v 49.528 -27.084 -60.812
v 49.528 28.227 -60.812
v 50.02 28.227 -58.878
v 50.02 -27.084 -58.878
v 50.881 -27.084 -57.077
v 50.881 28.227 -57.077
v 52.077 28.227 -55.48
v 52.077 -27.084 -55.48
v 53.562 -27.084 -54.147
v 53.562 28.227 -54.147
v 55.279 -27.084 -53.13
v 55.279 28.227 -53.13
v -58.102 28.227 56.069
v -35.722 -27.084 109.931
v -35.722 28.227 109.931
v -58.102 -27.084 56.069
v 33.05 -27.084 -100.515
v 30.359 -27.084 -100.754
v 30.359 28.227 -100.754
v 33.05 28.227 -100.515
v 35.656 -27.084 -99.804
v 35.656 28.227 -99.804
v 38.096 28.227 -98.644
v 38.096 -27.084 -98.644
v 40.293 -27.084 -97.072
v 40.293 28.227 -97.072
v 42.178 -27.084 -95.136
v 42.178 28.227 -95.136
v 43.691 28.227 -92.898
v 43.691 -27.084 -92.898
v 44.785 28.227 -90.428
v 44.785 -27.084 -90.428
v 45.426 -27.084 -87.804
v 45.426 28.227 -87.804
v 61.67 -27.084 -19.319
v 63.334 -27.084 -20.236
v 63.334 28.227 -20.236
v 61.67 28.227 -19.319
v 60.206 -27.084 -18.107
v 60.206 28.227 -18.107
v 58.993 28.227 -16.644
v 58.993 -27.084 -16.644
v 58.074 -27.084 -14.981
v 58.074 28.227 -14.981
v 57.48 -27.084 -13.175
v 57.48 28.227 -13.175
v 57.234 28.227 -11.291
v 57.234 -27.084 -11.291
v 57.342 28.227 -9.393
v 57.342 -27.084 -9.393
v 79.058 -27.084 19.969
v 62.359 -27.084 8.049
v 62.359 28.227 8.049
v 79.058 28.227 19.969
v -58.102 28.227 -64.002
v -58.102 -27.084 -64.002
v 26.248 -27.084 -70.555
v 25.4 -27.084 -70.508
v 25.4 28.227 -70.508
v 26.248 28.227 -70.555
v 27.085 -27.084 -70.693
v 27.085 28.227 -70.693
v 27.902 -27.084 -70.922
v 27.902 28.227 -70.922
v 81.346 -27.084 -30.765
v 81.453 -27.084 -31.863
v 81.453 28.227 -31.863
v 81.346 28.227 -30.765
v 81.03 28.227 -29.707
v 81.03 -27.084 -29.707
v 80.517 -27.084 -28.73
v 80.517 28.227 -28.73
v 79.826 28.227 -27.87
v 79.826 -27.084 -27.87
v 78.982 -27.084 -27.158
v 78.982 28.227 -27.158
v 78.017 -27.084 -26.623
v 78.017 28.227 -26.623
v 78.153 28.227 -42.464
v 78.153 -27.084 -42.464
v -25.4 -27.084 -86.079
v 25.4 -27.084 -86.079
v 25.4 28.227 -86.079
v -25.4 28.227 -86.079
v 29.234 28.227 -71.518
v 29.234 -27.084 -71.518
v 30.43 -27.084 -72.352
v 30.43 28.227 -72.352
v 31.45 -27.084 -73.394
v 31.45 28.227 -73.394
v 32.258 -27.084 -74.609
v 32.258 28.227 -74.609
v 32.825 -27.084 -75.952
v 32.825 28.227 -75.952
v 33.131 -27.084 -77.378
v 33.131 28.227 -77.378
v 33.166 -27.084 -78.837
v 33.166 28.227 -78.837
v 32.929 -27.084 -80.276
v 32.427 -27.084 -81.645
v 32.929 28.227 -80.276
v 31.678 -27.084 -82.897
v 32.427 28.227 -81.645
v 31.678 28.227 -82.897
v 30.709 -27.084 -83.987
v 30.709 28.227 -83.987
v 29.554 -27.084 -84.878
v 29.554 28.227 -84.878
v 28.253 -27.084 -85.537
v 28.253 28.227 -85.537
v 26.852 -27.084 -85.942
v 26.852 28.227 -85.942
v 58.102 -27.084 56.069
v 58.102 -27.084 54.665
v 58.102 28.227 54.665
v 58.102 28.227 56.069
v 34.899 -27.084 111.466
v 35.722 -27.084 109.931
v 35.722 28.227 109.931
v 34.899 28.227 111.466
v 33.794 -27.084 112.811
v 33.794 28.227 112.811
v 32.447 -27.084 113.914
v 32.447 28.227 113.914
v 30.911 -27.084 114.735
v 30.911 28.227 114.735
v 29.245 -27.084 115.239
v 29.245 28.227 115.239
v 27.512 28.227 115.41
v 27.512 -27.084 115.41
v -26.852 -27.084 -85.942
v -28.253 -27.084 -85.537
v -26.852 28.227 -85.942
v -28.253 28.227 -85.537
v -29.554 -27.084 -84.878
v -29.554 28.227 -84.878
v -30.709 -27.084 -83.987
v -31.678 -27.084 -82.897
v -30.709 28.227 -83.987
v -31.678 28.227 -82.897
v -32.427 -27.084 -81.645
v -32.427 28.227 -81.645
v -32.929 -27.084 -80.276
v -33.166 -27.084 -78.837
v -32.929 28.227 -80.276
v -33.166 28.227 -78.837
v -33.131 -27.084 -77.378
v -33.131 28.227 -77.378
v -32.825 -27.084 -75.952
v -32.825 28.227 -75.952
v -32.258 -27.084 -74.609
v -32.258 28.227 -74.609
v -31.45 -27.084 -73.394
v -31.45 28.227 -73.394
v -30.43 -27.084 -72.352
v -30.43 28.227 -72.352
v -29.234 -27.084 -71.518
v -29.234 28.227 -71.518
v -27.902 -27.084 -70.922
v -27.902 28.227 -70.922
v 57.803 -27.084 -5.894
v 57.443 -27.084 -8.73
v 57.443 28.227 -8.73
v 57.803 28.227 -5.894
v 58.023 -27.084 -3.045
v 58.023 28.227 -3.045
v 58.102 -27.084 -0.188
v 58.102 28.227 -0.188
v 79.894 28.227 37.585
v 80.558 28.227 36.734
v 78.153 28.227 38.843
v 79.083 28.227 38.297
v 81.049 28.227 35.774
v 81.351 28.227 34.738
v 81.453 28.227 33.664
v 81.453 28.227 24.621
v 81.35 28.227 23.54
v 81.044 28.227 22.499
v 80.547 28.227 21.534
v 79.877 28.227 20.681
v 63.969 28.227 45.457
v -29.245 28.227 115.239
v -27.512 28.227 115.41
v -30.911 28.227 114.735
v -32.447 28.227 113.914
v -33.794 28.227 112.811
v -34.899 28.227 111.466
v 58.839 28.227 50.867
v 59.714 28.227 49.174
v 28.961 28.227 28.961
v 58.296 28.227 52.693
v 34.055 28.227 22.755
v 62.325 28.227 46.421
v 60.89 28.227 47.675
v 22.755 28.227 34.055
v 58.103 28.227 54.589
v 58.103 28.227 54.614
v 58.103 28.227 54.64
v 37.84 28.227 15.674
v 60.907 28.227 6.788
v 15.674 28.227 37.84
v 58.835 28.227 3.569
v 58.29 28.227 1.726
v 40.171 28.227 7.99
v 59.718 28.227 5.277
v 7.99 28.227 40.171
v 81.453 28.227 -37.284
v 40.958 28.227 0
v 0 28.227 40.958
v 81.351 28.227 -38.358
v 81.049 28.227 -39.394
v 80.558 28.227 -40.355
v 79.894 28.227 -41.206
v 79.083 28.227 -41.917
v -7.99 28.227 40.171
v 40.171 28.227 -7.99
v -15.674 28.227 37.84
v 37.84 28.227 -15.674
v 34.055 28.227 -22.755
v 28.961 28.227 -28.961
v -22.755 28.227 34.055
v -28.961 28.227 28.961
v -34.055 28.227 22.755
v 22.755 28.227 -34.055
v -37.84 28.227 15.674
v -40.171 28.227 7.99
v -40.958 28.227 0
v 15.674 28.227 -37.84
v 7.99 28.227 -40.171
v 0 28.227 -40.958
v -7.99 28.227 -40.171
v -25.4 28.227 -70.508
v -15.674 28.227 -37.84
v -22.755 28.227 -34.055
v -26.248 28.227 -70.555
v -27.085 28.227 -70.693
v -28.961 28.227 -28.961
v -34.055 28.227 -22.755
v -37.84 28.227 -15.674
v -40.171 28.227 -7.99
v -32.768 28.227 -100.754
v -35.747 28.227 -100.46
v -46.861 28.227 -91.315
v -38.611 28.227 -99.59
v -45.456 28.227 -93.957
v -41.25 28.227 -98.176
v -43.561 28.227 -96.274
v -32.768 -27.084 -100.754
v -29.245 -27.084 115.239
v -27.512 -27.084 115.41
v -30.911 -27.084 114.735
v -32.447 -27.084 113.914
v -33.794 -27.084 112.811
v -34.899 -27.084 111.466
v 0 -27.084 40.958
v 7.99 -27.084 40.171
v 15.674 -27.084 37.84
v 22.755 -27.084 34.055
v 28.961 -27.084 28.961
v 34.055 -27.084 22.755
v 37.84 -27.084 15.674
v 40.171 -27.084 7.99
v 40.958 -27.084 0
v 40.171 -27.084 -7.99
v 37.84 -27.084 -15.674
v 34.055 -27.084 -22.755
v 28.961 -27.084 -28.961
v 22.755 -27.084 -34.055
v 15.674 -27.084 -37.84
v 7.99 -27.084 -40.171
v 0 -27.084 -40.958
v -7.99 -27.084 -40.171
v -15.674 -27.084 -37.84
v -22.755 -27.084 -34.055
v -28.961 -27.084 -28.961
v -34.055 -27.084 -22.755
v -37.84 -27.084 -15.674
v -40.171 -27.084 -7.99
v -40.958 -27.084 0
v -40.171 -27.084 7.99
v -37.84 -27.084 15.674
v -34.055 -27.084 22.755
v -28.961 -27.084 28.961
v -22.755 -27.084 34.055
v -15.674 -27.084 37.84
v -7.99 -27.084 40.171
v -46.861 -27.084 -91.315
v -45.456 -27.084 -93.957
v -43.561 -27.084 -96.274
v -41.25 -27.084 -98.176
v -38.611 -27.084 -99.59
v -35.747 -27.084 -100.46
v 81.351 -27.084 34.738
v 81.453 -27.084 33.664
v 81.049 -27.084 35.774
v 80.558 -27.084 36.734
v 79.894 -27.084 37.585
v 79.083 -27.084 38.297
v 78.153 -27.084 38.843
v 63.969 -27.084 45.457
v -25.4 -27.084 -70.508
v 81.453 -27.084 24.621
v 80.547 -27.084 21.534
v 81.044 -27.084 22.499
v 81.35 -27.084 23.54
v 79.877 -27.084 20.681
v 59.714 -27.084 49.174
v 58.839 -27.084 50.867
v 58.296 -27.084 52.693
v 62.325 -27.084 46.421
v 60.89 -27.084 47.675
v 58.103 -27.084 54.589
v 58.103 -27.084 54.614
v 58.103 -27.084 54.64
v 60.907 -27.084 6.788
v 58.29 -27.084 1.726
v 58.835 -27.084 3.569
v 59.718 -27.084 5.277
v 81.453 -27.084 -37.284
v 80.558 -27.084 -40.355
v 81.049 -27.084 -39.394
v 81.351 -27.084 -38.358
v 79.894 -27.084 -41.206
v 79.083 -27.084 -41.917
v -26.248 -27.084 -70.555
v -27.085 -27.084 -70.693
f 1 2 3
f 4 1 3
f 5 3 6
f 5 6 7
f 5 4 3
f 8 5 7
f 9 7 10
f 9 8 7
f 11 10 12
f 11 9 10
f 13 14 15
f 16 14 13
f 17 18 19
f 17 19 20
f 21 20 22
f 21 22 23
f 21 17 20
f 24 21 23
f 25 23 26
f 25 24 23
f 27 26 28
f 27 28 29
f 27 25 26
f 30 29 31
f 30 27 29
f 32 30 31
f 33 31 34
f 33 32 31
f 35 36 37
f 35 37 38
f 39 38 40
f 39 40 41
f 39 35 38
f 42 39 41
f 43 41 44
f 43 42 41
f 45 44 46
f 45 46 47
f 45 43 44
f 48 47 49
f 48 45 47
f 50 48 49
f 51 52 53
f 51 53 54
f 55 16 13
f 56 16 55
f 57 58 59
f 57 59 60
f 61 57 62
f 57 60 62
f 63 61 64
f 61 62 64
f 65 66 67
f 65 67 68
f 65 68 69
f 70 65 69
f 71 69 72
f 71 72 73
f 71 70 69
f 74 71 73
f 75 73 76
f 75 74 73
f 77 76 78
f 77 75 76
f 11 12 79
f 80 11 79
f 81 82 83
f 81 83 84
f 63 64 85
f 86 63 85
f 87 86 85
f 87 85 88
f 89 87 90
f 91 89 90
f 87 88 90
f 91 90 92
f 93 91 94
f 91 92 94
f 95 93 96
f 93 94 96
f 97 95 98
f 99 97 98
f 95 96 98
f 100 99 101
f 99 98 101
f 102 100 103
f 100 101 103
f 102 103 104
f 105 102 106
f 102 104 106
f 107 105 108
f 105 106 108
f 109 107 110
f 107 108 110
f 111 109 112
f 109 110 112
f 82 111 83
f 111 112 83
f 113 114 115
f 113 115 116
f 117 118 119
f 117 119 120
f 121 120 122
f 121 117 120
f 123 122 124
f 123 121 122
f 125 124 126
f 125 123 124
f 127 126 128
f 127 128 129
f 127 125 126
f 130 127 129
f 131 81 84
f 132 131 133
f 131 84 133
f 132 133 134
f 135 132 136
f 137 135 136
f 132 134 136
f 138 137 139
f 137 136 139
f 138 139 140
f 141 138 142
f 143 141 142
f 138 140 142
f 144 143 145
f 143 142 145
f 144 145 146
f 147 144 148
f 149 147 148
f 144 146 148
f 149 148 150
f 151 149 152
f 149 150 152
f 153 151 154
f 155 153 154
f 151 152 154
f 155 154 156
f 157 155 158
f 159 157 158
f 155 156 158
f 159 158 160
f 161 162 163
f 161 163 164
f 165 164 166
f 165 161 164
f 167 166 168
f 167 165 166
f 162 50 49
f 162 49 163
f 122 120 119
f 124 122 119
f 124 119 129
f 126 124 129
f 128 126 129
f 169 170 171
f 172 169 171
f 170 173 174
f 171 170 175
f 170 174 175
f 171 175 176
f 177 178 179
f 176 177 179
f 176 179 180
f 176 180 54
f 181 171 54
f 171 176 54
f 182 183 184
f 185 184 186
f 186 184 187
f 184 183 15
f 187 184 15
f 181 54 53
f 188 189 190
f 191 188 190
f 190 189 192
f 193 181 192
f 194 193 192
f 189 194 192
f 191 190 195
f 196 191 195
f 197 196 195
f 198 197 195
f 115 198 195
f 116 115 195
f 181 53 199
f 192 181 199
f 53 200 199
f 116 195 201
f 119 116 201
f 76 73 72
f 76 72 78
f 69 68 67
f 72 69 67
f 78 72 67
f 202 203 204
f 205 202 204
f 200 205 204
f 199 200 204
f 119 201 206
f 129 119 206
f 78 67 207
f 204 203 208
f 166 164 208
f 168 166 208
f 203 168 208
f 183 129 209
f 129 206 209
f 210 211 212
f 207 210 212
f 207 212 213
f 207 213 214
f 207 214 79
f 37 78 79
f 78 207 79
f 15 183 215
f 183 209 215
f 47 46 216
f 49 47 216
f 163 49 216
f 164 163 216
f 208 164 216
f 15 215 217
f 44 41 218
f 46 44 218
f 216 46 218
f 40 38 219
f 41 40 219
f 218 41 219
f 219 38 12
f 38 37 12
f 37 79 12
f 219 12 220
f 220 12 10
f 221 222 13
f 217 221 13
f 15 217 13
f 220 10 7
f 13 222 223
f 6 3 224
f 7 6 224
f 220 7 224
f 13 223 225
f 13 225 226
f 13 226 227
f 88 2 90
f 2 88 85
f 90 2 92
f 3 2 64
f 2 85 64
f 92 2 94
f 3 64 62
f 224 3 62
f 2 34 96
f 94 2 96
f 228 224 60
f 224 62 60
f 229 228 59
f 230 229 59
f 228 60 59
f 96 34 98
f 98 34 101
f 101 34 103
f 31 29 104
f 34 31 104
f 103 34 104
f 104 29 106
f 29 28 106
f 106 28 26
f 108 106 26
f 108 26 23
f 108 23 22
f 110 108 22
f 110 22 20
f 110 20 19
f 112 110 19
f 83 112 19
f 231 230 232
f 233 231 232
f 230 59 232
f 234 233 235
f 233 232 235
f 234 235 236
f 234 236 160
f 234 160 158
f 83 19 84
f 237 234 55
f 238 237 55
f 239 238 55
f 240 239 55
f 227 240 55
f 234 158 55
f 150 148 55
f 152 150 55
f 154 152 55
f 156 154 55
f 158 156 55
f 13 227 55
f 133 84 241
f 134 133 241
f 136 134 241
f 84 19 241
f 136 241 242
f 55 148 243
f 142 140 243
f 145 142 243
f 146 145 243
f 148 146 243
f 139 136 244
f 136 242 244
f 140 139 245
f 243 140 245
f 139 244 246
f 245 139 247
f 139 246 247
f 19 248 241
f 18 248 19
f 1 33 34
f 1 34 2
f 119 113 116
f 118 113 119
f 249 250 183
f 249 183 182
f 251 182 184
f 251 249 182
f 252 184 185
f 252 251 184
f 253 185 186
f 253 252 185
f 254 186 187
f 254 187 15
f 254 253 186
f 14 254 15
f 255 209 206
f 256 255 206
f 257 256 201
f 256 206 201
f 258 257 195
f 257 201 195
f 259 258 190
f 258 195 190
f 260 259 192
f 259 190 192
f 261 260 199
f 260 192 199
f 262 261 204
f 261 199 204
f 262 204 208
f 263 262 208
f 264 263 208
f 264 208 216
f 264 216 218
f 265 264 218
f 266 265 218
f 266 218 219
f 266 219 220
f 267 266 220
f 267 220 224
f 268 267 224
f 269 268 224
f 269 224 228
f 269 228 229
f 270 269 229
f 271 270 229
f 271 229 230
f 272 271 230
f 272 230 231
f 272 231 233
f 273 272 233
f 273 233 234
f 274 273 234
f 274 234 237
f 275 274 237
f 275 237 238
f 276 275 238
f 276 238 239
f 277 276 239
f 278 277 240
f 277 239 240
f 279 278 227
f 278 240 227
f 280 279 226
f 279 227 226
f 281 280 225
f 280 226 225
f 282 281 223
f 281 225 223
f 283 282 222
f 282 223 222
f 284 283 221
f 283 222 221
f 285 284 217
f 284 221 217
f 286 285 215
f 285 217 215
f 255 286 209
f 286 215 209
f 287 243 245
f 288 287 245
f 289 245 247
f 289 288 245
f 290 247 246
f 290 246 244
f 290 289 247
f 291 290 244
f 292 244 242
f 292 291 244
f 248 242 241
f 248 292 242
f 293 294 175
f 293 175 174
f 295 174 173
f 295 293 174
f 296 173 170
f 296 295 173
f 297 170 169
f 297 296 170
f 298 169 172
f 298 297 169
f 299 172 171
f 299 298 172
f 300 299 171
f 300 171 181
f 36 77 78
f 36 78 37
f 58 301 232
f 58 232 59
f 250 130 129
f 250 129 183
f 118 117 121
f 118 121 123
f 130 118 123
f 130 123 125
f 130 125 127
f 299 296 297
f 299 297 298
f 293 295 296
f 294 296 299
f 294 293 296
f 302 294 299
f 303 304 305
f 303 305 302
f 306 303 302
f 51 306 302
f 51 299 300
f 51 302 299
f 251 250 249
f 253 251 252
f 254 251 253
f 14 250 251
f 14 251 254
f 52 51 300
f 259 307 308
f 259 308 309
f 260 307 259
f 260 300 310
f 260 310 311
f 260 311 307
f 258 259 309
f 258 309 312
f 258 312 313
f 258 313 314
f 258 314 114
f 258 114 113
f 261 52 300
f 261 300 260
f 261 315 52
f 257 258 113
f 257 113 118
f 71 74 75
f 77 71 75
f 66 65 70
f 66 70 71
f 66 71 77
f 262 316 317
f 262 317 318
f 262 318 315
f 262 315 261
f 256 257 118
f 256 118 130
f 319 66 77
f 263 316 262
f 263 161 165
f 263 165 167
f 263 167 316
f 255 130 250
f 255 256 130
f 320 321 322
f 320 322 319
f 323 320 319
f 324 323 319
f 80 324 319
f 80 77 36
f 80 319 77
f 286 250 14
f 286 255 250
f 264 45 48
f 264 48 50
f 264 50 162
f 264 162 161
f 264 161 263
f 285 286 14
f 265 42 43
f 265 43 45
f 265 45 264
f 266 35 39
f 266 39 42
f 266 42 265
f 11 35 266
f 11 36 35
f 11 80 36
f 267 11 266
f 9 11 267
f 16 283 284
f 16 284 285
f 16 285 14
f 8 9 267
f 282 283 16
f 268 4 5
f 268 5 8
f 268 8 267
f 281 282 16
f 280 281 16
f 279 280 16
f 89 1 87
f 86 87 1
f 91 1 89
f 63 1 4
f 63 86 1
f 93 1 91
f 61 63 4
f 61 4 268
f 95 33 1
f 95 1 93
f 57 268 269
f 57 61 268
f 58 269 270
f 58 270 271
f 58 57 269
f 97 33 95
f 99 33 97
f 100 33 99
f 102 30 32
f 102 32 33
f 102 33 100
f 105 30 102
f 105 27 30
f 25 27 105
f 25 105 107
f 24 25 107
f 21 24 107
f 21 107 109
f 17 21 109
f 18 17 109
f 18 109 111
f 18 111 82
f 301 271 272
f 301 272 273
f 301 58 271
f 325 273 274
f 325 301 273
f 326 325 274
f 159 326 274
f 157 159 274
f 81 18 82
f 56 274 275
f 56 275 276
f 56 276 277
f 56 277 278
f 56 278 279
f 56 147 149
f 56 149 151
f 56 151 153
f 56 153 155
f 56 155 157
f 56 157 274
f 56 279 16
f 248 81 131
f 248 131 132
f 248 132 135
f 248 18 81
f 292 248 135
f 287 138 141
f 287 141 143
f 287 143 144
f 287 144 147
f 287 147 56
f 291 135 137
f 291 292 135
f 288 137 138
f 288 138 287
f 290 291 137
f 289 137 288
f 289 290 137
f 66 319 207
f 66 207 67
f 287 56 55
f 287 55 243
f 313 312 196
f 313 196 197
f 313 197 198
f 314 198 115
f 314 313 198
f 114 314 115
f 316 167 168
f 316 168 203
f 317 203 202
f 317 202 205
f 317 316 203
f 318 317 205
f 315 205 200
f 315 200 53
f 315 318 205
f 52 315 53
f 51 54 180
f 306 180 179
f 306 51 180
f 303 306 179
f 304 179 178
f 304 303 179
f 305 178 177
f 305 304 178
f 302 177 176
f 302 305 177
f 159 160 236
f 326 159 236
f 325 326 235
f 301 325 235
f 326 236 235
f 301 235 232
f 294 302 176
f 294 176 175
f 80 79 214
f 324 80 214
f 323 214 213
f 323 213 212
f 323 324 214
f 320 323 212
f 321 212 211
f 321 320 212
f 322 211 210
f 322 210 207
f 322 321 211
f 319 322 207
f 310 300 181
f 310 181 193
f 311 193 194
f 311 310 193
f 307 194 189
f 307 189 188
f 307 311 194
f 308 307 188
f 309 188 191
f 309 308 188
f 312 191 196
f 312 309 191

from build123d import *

# Parameters (mm, degrees)
BOSS_EXTRUDE1_DEPTH      = 28.22702
BOSS_EXTRUDE1_DEPTH_BACK = 27.08402
SKETCH2_R                = 40.9575
CUT_EXTRUDE1_DEPTH       = 152.701320166
CUT_EXTRUDE2_DEPTH       = 152.701320166


with BuildPart() as part:
    # Sketch1 → Boss-Extrude1 (new, two sides: drawn at the far end of the back side and taken through both)
    with BuildSketch(Plane(origin=(0, 0, 0), x_dir=(1, 0, 0), z_dir=(0, 1, 0)).offset(-BOSS_EXTRUDE1_DEPTH_BACK)):
        with BuildLine():
            Line((-35.721676258, -109.931199839), (-58.1025, -56.069211009))
            Line((-58.1025, -56.069211009), (-58.1025, -54.569599156))
            Line((-58.1025, -54.569599156), (-58.1025, 64.002262273))
            Line((-58.1025, 64.002262273), (-46.861446545, 91.314524953))
            ThreePointArc((-46.861446545, 91.314524953), (-41.24957855, 98.176226775), (-32.76841286, 100.75418))
            Line((-32.76841286, 100.75418), (30.359183597, 100.75418))
            ThreePointArc((30.359183597, 100.75418), (40.293026824, 97.071703902), (45.426195478, 87.803885872))
            Line((45.426195478, 87.803885872), (49.528165732, 60.811582924))
            ThreePointArc((49.528165732, 60.811582924), (51.439588659, 56.249062009), (55.27903878, 53.129966389))
            Line((55.27903878, 53.129966389), (78.152801145, 42.463755827))
            ThreePointArc((78.152801145, 42.463755827), (80.557519892, 40.354874086), (81.452537779, 37.284206824))
            Line((81.452537779, 37.284206824), (81.452537779, 31.863274858))
            ThreePointArc((81.452537779, 31.863274858), (80.517086587, 28.730043586), (78.016968856, 26.622528826))
            Line((78.016968856, 26.622528826), (63.334487079, 20.236471377))
            ThreePointArc((63.334487079, 20.236471377), (58.494345864, 15.83382392), (57.342134405, 9.393118961))
            Line((57.342134405, 9.393118961), (57.442982796, 8.729503635))
            ThreePointArc((57.442982796, 8.729503635), (57.930235286, 4.470832805), (58.1021964, 0.187828999))
            ThreePointArc((58.1021964, 0.187828999), (59.236377824, -4.444212154), (62.359072928, -8.048507927))
            Line((62.359072928, -8.048507927), (79.05801487, -19.969280438))
            ThreePointArc((79.05801487, -19.969280438), (80.818765563, -22.004906493), (81.452537779, -24.620694942))
            Line((81.452537779, -24.620694942), (81.452537779, -33.663524119))
            ThreePointArc((81.452537779, -33.663524119), (80.557519892, -36.73419138), (78.152801145, -38.843073121))
            Line((78.152801145, -38.843073121), (63.968698461, -45.457228827))
            ThreePointArc((63.968698461, -45.457228827), (59.714275337, -49.174099767), (58.102788562, -54.588742513))
            ThreePointArc((58.102788562, -54.588742513), (58.102572141, -54.627028957), (58.1025, -54.665315944))
            Line((58.1025, -54.665315944), (58.1025, -56.069211009))
            Line((58.1025, -56.069211009), (35.721676258, -109.931199839))
            ThreePointArc((35.721676258, -109.931199839), (32.447083012, -113.91449974), (27.512189111, -115.40998))
            Line((27.512189111, -115.40998), (-27.512189111, -115.40998))
            ThreePointArc((-27.512189111, -115.40998), (-32.447083012, -113.91449974), (-35.721676258, -109.931199839))
        make_face()
    extrude(amount=BOSS_EXTRUDE1_DEPTH + BOSS_EXTRUDE1_DEPTH_BACK)

    # Sketch2 → Cut-Extrude1 (cut, through all)
    with BuildSketch(Plane(origin=(0, 28.22702, 0), x_dir=(1, 0, 0), z_dir=(0, 1, 0))):
        with Locations(Location((0, 0, 0), (0, 0, 270))):
            Circle(SKETCH2_R)
    extrude(amount=-CUT_EXTRUDE1_DEPTH, mode=Mode.SUBTRACT)

    # Sketch3 → Cut-Extrude2 (cut, through all)
    with BuildSketch(Plane(origin=(0, 28.22702, 0), x_dir=(1, 0, 0), z_dir=(0, 1, 0))):
        with BuildLine():
            Line((25.4, 86.078568), (-25.4, 86.078568))
            ThreePointArc((-25.4, 86.078568), (-33.081115057, 79.561637348), (-27.902461028, 70.921529936))
            ThreePointArc((-27.902461028, 70.921529936), (-26.668169348, 70.612352943), (-25.4, 70.508368))
            Line((-25.4, 70.508368), (25.4, 70.508368))
            ThreePointArc((25.4, 70.508368), (26.668169348, 70.612352943), (27.902461028, 70.921529936))
            ThreePointArc((27.902461028, 70.921529936), (33.081115057, 79.561637348), (25.4, 86.078568))
        make_face()
    extrude(amount=-CUT_EXTRUDE2_DEPTH, mode=Mode.SUBTRACT)


solid = part.part
